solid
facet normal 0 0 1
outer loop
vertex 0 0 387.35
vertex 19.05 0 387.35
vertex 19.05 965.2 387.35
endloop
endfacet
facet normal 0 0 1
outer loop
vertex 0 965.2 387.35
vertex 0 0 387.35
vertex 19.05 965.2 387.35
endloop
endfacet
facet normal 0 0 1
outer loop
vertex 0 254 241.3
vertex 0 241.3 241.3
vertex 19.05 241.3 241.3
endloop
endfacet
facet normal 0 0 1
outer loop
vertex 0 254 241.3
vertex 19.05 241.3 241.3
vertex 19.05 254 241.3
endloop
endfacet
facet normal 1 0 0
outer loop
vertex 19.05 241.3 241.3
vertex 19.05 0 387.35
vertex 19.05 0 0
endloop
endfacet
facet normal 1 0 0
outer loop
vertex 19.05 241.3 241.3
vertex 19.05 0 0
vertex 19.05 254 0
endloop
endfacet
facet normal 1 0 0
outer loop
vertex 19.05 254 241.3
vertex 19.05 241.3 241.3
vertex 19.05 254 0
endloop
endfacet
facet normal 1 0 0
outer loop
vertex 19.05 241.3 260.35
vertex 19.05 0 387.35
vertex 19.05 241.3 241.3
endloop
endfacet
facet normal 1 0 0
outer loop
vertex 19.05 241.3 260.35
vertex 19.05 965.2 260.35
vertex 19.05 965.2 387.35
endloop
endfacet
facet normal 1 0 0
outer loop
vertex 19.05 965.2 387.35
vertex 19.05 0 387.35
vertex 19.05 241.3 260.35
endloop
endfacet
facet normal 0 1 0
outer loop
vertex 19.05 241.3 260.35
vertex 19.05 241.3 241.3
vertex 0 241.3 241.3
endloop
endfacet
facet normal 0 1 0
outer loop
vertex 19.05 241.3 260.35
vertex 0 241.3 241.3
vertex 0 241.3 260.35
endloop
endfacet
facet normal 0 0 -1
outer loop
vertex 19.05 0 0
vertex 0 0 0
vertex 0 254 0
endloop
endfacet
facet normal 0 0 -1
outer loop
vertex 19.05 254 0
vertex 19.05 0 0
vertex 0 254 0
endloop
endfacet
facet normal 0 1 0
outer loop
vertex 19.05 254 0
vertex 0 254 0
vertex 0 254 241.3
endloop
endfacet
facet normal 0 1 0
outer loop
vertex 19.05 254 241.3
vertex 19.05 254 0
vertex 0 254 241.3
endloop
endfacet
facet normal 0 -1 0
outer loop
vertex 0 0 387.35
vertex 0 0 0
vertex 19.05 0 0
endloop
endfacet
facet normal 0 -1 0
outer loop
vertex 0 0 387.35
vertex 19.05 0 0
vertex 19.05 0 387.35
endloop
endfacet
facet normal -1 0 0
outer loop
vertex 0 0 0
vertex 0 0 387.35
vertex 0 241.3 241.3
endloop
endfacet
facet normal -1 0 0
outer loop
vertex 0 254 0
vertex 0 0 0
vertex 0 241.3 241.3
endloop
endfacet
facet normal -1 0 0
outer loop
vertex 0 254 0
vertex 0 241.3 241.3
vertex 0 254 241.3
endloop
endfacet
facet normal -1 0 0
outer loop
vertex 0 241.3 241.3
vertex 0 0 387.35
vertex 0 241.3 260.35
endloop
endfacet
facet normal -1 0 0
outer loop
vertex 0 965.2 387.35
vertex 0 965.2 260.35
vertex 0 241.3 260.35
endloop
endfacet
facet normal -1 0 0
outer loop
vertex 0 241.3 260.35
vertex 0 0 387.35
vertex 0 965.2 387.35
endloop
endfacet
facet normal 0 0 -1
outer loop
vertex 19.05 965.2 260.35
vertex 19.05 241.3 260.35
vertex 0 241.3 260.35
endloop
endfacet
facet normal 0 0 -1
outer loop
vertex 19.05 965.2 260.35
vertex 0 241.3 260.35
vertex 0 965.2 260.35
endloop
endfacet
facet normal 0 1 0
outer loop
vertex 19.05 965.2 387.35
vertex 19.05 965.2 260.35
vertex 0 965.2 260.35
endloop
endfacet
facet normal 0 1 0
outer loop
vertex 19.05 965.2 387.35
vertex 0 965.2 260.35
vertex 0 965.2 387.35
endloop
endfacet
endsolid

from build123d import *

# Parameters (mm, degrees)
F0_W     = 254
F0_H     = 387.35
F1_DEPTH = 19.05
F2_W     = 12.7
F2_H     = 146.05
F3_DEPTH = 19.051
F4_W     = 723.9
F4_H     = 127
F5_DEPTH = 19.05


with BuildPart() as f1:
    # F0 (on Right) → F1 (new body)
    with BuildSketch(Plane.YZ):
        with Locations((127, 193.675)):
            Rectangle(F0_W, F0_H)
    extrude(amount=F1_DEPTH)

    # F2 (on face) → F3 (cut, through all)
    with BuildSketch(Plane.YZ.offset(19.05)):
        with Locations((247.65, 314.325)):
            Rectangle(F2_W, F2_H)
    extrude(amount=-F3_DEPTH, mode=Mode.SUBTRACT)

    # F4 (on face) → F5 (join)
    with BuildSketch(Plane.YZ.offset(19.05)):
        with Locations((603.25, 323.85)):
            Rectangle(F4_W, F4_H)
    extrude(amount=-F5_DEPTH)


solid = f1.part
